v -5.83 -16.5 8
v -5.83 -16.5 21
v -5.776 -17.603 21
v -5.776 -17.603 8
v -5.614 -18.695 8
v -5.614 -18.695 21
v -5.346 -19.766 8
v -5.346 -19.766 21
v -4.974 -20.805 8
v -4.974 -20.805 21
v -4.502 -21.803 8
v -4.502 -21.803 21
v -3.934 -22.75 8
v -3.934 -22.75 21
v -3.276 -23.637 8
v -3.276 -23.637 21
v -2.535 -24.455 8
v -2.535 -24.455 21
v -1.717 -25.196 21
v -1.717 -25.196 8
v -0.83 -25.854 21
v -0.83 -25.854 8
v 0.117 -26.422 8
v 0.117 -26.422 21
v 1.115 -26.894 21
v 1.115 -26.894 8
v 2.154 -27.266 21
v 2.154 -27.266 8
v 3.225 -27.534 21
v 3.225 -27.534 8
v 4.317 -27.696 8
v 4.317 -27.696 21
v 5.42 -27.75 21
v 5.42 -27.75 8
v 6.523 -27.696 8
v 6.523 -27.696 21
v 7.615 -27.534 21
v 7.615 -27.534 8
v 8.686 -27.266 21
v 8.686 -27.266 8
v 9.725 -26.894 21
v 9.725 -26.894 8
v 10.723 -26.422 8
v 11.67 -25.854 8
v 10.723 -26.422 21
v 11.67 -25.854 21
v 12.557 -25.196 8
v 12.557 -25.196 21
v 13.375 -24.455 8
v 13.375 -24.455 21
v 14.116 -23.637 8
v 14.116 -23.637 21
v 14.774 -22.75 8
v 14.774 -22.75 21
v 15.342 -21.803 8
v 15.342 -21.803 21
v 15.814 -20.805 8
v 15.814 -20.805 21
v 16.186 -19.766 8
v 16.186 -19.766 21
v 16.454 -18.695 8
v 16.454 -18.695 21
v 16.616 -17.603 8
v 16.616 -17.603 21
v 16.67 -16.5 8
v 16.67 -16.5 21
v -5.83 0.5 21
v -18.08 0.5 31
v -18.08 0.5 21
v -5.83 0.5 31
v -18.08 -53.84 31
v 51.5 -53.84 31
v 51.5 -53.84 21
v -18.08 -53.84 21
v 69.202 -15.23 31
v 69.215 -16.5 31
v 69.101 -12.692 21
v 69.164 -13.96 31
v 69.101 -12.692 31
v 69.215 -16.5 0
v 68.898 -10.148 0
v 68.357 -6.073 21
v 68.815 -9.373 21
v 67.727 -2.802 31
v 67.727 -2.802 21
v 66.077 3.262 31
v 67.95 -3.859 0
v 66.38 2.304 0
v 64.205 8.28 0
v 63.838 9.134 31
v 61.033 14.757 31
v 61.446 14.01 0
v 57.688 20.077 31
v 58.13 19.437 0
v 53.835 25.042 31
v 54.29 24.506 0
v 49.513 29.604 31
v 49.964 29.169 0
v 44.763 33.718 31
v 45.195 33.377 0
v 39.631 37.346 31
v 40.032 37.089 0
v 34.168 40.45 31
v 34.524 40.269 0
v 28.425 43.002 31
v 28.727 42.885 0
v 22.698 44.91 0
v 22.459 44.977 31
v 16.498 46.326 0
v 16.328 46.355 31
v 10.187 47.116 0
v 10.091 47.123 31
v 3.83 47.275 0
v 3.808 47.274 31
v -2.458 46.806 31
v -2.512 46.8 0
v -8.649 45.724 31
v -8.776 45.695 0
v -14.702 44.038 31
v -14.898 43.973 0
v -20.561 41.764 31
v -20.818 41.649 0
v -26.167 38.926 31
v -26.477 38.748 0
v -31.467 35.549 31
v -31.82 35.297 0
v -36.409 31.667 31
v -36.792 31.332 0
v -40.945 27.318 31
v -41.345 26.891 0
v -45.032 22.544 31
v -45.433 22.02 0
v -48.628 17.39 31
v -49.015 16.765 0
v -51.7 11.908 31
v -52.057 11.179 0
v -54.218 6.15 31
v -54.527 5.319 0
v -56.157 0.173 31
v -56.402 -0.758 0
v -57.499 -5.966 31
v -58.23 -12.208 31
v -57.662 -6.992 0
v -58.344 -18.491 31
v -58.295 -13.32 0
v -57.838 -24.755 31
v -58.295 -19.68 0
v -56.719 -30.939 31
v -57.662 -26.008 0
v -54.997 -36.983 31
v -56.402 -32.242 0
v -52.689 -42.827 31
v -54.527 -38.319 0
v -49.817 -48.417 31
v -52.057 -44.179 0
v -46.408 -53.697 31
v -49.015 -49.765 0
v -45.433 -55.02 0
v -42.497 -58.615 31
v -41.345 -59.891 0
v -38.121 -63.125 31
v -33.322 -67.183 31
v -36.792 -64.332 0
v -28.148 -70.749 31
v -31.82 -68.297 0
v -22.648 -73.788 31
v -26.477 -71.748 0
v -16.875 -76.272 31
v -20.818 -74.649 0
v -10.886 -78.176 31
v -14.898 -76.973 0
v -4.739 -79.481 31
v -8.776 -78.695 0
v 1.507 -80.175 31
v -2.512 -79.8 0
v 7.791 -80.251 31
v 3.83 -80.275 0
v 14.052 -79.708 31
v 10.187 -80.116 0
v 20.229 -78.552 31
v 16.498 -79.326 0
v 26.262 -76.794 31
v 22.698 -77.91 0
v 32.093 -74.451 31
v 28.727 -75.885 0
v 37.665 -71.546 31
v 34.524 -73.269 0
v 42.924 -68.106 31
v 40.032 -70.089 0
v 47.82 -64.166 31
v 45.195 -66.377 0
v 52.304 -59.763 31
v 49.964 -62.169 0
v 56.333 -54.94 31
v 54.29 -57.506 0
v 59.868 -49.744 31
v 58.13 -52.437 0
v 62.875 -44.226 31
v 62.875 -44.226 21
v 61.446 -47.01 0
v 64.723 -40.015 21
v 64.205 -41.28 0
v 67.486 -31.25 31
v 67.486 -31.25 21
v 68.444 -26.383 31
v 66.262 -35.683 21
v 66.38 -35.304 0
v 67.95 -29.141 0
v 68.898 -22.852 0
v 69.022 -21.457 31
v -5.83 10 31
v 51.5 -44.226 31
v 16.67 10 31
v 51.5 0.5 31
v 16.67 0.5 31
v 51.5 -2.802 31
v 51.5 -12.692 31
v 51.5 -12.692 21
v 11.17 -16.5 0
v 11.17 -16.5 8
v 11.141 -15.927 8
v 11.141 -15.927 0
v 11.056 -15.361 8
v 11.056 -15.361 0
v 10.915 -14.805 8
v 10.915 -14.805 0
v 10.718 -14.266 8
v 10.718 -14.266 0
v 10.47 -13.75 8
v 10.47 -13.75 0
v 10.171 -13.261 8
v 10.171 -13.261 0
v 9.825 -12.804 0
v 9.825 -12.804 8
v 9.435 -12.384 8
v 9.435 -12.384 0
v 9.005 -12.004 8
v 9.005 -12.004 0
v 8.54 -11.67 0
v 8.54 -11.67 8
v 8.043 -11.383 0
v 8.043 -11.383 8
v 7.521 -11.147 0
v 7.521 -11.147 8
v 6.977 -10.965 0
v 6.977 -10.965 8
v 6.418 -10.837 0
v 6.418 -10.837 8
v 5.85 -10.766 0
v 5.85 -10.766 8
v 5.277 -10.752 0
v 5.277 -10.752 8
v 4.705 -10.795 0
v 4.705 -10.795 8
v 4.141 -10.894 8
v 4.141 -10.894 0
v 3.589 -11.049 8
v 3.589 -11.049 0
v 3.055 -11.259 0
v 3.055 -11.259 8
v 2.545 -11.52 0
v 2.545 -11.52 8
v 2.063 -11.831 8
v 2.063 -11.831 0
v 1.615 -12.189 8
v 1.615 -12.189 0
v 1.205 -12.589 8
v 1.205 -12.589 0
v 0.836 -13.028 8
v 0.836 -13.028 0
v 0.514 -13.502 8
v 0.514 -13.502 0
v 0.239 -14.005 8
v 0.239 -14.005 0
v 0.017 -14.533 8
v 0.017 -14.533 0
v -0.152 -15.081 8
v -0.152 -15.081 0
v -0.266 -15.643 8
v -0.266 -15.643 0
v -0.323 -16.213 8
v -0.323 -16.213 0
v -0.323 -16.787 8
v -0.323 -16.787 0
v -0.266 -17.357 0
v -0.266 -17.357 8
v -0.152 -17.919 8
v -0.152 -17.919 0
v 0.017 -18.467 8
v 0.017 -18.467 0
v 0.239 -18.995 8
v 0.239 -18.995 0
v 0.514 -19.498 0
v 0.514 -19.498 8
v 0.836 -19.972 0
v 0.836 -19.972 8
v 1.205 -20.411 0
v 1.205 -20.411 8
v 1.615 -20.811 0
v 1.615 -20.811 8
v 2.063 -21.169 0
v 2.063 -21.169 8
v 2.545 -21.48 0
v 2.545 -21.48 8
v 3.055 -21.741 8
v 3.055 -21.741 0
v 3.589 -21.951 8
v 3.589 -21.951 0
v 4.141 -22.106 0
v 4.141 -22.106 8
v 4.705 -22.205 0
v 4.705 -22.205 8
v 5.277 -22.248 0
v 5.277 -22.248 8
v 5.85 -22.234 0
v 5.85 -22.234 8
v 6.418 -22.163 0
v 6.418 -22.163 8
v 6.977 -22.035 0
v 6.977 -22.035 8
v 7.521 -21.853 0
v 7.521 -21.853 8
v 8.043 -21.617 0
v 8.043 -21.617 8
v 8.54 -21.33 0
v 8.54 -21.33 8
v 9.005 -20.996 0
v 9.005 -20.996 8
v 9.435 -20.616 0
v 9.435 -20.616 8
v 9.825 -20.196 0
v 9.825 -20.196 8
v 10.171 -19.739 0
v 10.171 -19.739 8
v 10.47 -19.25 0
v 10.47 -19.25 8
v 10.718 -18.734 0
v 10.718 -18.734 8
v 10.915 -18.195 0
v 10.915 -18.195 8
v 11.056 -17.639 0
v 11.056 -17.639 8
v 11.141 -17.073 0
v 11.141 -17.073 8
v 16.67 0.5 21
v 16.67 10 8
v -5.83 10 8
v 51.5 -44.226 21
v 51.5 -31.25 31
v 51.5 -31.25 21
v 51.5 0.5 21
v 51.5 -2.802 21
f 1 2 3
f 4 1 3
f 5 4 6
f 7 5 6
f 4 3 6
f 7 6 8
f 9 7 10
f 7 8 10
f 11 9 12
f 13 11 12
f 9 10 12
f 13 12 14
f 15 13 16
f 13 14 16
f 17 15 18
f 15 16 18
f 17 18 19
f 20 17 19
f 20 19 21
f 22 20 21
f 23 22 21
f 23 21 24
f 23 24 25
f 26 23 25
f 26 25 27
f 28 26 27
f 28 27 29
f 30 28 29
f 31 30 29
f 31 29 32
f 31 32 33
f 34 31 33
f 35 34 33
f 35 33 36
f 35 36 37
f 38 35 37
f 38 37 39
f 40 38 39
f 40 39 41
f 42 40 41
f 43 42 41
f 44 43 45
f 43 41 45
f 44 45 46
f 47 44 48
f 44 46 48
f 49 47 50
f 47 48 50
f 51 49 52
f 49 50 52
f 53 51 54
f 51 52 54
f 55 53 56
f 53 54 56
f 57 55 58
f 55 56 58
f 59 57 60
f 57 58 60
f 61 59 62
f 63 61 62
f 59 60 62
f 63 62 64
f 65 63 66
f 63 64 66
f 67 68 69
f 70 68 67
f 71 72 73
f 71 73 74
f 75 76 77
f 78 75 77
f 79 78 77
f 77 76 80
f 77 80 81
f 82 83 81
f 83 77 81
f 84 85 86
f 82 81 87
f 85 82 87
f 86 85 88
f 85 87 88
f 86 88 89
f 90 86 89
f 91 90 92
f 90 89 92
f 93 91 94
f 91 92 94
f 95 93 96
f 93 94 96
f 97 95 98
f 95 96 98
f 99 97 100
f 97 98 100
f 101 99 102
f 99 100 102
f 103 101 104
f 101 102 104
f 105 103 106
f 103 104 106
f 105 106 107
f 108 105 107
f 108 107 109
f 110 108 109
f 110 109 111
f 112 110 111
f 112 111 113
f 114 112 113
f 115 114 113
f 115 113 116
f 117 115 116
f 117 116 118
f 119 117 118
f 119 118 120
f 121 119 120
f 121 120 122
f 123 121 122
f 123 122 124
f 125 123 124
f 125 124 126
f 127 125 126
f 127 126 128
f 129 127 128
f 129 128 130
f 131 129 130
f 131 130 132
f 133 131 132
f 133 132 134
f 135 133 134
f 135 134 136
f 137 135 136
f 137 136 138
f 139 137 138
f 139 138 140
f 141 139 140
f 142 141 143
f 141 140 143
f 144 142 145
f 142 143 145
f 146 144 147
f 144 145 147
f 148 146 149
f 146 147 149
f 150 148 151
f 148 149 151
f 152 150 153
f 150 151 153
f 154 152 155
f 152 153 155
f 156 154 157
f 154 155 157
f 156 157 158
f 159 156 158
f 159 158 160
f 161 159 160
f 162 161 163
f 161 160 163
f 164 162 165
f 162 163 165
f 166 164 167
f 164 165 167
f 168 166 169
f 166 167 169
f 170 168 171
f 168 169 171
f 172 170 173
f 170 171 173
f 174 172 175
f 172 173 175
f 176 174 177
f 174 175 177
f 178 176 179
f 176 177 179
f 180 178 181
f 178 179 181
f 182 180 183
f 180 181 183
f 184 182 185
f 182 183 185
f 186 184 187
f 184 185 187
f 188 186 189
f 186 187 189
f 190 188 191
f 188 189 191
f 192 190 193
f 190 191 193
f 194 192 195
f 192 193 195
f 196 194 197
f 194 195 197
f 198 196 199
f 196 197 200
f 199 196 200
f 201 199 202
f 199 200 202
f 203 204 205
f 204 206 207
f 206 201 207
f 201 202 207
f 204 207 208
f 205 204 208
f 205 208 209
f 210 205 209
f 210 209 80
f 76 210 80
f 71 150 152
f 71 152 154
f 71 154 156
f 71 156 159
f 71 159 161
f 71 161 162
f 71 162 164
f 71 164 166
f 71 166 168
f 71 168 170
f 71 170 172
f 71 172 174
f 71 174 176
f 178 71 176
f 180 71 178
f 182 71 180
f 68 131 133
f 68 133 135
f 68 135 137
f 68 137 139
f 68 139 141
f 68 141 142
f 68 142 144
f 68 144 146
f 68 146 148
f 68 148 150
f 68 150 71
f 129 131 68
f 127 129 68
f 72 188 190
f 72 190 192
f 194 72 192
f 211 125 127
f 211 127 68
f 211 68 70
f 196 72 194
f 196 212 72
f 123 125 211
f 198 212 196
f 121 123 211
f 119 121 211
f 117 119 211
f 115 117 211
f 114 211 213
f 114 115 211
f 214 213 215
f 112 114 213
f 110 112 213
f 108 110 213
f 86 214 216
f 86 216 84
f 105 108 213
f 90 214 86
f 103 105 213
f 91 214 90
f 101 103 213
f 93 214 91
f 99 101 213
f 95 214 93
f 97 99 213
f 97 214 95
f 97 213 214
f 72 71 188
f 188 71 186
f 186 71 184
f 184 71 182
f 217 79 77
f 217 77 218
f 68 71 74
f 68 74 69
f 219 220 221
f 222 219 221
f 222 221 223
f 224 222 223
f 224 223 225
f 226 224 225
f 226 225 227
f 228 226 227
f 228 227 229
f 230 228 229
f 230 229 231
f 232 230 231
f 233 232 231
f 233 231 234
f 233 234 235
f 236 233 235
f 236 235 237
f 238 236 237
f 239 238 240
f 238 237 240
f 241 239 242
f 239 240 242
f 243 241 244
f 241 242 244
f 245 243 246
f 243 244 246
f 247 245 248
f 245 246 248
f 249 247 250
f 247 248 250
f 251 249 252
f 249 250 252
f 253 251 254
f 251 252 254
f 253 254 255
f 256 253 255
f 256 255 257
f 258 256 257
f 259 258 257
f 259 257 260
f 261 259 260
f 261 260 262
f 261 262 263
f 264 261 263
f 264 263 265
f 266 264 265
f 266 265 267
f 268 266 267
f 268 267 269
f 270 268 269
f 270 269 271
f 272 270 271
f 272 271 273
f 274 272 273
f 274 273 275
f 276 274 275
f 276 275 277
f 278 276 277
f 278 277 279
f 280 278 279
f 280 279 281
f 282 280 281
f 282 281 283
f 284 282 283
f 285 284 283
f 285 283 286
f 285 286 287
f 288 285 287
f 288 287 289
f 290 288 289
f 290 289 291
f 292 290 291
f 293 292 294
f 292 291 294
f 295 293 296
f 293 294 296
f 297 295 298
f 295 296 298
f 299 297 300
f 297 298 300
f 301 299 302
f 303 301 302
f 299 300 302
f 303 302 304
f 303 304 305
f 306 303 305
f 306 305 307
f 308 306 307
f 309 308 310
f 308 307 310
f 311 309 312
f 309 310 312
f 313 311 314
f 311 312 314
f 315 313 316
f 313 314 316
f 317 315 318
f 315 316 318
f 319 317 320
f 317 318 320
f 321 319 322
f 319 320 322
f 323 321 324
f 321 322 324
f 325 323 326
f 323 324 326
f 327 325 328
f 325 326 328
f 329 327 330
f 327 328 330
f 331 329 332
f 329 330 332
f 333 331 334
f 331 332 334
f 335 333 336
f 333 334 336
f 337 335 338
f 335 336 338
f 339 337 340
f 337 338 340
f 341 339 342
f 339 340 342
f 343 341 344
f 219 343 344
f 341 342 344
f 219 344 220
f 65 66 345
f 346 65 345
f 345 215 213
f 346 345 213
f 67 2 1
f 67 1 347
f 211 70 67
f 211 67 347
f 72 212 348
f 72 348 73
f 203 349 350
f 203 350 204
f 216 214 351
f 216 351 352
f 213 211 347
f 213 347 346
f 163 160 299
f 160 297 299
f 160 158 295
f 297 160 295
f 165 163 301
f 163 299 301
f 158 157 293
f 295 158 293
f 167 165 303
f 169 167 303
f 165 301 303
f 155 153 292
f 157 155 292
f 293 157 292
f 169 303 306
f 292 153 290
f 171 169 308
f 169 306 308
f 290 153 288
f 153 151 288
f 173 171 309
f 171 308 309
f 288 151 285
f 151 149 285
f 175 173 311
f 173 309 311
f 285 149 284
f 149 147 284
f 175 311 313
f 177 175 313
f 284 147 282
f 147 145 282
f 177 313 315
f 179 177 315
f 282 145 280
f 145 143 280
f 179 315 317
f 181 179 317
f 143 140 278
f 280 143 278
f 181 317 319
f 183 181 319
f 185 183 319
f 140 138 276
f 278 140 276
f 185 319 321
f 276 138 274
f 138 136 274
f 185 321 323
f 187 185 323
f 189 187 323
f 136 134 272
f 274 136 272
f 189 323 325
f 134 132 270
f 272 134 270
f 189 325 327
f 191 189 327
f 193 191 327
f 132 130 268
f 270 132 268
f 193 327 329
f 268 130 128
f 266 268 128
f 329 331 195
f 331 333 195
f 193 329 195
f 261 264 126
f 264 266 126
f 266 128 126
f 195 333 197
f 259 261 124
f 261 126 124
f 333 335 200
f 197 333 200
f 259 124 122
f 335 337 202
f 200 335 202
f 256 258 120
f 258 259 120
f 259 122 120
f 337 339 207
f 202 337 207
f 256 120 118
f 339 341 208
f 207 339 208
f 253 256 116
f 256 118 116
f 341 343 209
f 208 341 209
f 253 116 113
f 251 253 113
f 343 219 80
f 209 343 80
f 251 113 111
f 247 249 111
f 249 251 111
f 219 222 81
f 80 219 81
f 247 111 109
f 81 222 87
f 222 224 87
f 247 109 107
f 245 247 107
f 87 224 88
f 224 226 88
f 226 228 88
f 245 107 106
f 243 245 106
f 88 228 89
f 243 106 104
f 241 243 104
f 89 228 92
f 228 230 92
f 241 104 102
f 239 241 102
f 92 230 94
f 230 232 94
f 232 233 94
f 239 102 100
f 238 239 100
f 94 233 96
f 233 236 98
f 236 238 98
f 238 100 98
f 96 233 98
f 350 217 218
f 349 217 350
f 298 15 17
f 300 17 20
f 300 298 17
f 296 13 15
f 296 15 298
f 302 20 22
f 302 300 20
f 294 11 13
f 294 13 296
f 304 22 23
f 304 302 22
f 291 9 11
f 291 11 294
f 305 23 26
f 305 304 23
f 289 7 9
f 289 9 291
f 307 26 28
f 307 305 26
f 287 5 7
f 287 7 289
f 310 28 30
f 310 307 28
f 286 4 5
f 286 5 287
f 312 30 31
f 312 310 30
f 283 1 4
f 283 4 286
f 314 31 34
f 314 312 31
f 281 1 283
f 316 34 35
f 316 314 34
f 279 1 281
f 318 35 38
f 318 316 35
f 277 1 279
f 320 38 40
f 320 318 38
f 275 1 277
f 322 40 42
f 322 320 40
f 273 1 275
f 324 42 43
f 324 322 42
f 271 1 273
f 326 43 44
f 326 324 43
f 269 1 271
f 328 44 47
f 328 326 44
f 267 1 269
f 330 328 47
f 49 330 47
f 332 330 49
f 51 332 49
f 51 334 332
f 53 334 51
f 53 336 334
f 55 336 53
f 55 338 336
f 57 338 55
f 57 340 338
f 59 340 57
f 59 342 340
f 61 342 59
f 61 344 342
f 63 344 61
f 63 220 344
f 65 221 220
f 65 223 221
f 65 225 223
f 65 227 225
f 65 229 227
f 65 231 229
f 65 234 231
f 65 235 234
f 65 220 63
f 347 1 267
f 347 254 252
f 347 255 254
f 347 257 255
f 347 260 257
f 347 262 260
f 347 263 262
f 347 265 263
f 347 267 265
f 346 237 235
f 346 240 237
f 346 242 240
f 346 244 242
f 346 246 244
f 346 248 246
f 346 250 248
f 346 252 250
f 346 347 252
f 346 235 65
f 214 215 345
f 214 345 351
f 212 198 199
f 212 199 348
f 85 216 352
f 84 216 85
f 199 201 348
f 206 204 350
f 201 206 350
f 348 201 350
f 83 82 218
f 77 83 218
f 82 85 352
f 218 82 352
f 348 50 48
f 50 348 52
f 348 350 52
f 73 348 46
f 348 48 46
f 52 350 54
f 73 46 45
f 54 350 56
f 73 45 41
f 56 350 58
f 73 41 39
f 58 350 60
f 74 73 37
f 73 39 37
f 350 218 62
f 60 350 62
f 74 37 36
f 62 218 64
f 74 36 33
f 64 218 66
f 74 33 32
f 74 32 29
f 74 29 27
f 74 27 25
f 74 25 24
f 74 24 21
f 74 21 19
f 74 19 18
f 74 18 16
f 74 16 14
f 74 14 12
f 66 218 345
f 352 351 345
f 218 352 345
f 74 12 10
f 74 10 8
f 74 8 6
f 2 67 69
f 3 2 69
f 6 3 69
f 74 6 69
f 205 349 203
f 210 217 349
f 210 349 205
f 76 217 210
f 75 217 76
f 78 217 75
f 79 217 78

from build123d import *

# Parameters (mm, degrees)
SKETCH_R        = 63.794686
PAD_DEPTH       = 31
POCKET_DEPTH    = 10
POCKET001_DEPTH = 23
SKETCH003_R     = 5.75
POCKET002_DEPTH = 31.001


with BuildPart() as part:
    # Sketch → Pad (new body)
    with BuildSketch(Plane.XY):
        with Locations((5.42, -16.5)):
            Circle(SKETCH_R)
    extrude(amount=PAD_DEPTH)

    # Sketch001 (on Face6 of Pad) → Pocket (cut)
    with BuildSketch(Plane.XY.offset(31)):
        Polygon((-18.08, 0.5), (51.5, 0.5), (51.5, -2.802), (101.5, -2.802), (101.5, -12.692), (51.5, -12.692), (51.5, -31.25), (101.5, -31.25), (101.5, -44.2261), (51.5, -44.2261), (51.5, -53.84), (-18.08, -53.84), align=None)
    extrude(amount=-POCKET_DEPTH, mode=Mode.SUBTRACT)

    # Sketch002 (on Face7 of Pocket) → Pocket001 (cut)
    with BuildSketch(Plane.XY.offset(31)):
        with BuildLine():
            ThreePointArc((-5.83, -16.5), (5.42, -27.75), (16.67, -16.5))
            Line((16.67, -16.5), (16.67, 0))
            Line((16.67, 10), (16.67, 0))
            Line((-5.83, 10), (16.67, 10))
            Line((-5.83, 0), (-5.83, 10))
            Line((-5.83, -16.5), (-5.83, 0))
        make_face()
    extrude(amount=-POCKET001_DEPTH, mode=Mode.SUBTRACT)

    # Sketch003 (on Face7 of Pocket001) → Pocket002 (cut, through all)
    with BuildSketch(Plane.XY.offset(31)):
        with Locations((5.42, -16.5)):
            Circle(SKETCH003_R)
    extrude(amount=-POCKET002_DEPTH, mode=Mode.SUBTRACT)


solid = part.part
